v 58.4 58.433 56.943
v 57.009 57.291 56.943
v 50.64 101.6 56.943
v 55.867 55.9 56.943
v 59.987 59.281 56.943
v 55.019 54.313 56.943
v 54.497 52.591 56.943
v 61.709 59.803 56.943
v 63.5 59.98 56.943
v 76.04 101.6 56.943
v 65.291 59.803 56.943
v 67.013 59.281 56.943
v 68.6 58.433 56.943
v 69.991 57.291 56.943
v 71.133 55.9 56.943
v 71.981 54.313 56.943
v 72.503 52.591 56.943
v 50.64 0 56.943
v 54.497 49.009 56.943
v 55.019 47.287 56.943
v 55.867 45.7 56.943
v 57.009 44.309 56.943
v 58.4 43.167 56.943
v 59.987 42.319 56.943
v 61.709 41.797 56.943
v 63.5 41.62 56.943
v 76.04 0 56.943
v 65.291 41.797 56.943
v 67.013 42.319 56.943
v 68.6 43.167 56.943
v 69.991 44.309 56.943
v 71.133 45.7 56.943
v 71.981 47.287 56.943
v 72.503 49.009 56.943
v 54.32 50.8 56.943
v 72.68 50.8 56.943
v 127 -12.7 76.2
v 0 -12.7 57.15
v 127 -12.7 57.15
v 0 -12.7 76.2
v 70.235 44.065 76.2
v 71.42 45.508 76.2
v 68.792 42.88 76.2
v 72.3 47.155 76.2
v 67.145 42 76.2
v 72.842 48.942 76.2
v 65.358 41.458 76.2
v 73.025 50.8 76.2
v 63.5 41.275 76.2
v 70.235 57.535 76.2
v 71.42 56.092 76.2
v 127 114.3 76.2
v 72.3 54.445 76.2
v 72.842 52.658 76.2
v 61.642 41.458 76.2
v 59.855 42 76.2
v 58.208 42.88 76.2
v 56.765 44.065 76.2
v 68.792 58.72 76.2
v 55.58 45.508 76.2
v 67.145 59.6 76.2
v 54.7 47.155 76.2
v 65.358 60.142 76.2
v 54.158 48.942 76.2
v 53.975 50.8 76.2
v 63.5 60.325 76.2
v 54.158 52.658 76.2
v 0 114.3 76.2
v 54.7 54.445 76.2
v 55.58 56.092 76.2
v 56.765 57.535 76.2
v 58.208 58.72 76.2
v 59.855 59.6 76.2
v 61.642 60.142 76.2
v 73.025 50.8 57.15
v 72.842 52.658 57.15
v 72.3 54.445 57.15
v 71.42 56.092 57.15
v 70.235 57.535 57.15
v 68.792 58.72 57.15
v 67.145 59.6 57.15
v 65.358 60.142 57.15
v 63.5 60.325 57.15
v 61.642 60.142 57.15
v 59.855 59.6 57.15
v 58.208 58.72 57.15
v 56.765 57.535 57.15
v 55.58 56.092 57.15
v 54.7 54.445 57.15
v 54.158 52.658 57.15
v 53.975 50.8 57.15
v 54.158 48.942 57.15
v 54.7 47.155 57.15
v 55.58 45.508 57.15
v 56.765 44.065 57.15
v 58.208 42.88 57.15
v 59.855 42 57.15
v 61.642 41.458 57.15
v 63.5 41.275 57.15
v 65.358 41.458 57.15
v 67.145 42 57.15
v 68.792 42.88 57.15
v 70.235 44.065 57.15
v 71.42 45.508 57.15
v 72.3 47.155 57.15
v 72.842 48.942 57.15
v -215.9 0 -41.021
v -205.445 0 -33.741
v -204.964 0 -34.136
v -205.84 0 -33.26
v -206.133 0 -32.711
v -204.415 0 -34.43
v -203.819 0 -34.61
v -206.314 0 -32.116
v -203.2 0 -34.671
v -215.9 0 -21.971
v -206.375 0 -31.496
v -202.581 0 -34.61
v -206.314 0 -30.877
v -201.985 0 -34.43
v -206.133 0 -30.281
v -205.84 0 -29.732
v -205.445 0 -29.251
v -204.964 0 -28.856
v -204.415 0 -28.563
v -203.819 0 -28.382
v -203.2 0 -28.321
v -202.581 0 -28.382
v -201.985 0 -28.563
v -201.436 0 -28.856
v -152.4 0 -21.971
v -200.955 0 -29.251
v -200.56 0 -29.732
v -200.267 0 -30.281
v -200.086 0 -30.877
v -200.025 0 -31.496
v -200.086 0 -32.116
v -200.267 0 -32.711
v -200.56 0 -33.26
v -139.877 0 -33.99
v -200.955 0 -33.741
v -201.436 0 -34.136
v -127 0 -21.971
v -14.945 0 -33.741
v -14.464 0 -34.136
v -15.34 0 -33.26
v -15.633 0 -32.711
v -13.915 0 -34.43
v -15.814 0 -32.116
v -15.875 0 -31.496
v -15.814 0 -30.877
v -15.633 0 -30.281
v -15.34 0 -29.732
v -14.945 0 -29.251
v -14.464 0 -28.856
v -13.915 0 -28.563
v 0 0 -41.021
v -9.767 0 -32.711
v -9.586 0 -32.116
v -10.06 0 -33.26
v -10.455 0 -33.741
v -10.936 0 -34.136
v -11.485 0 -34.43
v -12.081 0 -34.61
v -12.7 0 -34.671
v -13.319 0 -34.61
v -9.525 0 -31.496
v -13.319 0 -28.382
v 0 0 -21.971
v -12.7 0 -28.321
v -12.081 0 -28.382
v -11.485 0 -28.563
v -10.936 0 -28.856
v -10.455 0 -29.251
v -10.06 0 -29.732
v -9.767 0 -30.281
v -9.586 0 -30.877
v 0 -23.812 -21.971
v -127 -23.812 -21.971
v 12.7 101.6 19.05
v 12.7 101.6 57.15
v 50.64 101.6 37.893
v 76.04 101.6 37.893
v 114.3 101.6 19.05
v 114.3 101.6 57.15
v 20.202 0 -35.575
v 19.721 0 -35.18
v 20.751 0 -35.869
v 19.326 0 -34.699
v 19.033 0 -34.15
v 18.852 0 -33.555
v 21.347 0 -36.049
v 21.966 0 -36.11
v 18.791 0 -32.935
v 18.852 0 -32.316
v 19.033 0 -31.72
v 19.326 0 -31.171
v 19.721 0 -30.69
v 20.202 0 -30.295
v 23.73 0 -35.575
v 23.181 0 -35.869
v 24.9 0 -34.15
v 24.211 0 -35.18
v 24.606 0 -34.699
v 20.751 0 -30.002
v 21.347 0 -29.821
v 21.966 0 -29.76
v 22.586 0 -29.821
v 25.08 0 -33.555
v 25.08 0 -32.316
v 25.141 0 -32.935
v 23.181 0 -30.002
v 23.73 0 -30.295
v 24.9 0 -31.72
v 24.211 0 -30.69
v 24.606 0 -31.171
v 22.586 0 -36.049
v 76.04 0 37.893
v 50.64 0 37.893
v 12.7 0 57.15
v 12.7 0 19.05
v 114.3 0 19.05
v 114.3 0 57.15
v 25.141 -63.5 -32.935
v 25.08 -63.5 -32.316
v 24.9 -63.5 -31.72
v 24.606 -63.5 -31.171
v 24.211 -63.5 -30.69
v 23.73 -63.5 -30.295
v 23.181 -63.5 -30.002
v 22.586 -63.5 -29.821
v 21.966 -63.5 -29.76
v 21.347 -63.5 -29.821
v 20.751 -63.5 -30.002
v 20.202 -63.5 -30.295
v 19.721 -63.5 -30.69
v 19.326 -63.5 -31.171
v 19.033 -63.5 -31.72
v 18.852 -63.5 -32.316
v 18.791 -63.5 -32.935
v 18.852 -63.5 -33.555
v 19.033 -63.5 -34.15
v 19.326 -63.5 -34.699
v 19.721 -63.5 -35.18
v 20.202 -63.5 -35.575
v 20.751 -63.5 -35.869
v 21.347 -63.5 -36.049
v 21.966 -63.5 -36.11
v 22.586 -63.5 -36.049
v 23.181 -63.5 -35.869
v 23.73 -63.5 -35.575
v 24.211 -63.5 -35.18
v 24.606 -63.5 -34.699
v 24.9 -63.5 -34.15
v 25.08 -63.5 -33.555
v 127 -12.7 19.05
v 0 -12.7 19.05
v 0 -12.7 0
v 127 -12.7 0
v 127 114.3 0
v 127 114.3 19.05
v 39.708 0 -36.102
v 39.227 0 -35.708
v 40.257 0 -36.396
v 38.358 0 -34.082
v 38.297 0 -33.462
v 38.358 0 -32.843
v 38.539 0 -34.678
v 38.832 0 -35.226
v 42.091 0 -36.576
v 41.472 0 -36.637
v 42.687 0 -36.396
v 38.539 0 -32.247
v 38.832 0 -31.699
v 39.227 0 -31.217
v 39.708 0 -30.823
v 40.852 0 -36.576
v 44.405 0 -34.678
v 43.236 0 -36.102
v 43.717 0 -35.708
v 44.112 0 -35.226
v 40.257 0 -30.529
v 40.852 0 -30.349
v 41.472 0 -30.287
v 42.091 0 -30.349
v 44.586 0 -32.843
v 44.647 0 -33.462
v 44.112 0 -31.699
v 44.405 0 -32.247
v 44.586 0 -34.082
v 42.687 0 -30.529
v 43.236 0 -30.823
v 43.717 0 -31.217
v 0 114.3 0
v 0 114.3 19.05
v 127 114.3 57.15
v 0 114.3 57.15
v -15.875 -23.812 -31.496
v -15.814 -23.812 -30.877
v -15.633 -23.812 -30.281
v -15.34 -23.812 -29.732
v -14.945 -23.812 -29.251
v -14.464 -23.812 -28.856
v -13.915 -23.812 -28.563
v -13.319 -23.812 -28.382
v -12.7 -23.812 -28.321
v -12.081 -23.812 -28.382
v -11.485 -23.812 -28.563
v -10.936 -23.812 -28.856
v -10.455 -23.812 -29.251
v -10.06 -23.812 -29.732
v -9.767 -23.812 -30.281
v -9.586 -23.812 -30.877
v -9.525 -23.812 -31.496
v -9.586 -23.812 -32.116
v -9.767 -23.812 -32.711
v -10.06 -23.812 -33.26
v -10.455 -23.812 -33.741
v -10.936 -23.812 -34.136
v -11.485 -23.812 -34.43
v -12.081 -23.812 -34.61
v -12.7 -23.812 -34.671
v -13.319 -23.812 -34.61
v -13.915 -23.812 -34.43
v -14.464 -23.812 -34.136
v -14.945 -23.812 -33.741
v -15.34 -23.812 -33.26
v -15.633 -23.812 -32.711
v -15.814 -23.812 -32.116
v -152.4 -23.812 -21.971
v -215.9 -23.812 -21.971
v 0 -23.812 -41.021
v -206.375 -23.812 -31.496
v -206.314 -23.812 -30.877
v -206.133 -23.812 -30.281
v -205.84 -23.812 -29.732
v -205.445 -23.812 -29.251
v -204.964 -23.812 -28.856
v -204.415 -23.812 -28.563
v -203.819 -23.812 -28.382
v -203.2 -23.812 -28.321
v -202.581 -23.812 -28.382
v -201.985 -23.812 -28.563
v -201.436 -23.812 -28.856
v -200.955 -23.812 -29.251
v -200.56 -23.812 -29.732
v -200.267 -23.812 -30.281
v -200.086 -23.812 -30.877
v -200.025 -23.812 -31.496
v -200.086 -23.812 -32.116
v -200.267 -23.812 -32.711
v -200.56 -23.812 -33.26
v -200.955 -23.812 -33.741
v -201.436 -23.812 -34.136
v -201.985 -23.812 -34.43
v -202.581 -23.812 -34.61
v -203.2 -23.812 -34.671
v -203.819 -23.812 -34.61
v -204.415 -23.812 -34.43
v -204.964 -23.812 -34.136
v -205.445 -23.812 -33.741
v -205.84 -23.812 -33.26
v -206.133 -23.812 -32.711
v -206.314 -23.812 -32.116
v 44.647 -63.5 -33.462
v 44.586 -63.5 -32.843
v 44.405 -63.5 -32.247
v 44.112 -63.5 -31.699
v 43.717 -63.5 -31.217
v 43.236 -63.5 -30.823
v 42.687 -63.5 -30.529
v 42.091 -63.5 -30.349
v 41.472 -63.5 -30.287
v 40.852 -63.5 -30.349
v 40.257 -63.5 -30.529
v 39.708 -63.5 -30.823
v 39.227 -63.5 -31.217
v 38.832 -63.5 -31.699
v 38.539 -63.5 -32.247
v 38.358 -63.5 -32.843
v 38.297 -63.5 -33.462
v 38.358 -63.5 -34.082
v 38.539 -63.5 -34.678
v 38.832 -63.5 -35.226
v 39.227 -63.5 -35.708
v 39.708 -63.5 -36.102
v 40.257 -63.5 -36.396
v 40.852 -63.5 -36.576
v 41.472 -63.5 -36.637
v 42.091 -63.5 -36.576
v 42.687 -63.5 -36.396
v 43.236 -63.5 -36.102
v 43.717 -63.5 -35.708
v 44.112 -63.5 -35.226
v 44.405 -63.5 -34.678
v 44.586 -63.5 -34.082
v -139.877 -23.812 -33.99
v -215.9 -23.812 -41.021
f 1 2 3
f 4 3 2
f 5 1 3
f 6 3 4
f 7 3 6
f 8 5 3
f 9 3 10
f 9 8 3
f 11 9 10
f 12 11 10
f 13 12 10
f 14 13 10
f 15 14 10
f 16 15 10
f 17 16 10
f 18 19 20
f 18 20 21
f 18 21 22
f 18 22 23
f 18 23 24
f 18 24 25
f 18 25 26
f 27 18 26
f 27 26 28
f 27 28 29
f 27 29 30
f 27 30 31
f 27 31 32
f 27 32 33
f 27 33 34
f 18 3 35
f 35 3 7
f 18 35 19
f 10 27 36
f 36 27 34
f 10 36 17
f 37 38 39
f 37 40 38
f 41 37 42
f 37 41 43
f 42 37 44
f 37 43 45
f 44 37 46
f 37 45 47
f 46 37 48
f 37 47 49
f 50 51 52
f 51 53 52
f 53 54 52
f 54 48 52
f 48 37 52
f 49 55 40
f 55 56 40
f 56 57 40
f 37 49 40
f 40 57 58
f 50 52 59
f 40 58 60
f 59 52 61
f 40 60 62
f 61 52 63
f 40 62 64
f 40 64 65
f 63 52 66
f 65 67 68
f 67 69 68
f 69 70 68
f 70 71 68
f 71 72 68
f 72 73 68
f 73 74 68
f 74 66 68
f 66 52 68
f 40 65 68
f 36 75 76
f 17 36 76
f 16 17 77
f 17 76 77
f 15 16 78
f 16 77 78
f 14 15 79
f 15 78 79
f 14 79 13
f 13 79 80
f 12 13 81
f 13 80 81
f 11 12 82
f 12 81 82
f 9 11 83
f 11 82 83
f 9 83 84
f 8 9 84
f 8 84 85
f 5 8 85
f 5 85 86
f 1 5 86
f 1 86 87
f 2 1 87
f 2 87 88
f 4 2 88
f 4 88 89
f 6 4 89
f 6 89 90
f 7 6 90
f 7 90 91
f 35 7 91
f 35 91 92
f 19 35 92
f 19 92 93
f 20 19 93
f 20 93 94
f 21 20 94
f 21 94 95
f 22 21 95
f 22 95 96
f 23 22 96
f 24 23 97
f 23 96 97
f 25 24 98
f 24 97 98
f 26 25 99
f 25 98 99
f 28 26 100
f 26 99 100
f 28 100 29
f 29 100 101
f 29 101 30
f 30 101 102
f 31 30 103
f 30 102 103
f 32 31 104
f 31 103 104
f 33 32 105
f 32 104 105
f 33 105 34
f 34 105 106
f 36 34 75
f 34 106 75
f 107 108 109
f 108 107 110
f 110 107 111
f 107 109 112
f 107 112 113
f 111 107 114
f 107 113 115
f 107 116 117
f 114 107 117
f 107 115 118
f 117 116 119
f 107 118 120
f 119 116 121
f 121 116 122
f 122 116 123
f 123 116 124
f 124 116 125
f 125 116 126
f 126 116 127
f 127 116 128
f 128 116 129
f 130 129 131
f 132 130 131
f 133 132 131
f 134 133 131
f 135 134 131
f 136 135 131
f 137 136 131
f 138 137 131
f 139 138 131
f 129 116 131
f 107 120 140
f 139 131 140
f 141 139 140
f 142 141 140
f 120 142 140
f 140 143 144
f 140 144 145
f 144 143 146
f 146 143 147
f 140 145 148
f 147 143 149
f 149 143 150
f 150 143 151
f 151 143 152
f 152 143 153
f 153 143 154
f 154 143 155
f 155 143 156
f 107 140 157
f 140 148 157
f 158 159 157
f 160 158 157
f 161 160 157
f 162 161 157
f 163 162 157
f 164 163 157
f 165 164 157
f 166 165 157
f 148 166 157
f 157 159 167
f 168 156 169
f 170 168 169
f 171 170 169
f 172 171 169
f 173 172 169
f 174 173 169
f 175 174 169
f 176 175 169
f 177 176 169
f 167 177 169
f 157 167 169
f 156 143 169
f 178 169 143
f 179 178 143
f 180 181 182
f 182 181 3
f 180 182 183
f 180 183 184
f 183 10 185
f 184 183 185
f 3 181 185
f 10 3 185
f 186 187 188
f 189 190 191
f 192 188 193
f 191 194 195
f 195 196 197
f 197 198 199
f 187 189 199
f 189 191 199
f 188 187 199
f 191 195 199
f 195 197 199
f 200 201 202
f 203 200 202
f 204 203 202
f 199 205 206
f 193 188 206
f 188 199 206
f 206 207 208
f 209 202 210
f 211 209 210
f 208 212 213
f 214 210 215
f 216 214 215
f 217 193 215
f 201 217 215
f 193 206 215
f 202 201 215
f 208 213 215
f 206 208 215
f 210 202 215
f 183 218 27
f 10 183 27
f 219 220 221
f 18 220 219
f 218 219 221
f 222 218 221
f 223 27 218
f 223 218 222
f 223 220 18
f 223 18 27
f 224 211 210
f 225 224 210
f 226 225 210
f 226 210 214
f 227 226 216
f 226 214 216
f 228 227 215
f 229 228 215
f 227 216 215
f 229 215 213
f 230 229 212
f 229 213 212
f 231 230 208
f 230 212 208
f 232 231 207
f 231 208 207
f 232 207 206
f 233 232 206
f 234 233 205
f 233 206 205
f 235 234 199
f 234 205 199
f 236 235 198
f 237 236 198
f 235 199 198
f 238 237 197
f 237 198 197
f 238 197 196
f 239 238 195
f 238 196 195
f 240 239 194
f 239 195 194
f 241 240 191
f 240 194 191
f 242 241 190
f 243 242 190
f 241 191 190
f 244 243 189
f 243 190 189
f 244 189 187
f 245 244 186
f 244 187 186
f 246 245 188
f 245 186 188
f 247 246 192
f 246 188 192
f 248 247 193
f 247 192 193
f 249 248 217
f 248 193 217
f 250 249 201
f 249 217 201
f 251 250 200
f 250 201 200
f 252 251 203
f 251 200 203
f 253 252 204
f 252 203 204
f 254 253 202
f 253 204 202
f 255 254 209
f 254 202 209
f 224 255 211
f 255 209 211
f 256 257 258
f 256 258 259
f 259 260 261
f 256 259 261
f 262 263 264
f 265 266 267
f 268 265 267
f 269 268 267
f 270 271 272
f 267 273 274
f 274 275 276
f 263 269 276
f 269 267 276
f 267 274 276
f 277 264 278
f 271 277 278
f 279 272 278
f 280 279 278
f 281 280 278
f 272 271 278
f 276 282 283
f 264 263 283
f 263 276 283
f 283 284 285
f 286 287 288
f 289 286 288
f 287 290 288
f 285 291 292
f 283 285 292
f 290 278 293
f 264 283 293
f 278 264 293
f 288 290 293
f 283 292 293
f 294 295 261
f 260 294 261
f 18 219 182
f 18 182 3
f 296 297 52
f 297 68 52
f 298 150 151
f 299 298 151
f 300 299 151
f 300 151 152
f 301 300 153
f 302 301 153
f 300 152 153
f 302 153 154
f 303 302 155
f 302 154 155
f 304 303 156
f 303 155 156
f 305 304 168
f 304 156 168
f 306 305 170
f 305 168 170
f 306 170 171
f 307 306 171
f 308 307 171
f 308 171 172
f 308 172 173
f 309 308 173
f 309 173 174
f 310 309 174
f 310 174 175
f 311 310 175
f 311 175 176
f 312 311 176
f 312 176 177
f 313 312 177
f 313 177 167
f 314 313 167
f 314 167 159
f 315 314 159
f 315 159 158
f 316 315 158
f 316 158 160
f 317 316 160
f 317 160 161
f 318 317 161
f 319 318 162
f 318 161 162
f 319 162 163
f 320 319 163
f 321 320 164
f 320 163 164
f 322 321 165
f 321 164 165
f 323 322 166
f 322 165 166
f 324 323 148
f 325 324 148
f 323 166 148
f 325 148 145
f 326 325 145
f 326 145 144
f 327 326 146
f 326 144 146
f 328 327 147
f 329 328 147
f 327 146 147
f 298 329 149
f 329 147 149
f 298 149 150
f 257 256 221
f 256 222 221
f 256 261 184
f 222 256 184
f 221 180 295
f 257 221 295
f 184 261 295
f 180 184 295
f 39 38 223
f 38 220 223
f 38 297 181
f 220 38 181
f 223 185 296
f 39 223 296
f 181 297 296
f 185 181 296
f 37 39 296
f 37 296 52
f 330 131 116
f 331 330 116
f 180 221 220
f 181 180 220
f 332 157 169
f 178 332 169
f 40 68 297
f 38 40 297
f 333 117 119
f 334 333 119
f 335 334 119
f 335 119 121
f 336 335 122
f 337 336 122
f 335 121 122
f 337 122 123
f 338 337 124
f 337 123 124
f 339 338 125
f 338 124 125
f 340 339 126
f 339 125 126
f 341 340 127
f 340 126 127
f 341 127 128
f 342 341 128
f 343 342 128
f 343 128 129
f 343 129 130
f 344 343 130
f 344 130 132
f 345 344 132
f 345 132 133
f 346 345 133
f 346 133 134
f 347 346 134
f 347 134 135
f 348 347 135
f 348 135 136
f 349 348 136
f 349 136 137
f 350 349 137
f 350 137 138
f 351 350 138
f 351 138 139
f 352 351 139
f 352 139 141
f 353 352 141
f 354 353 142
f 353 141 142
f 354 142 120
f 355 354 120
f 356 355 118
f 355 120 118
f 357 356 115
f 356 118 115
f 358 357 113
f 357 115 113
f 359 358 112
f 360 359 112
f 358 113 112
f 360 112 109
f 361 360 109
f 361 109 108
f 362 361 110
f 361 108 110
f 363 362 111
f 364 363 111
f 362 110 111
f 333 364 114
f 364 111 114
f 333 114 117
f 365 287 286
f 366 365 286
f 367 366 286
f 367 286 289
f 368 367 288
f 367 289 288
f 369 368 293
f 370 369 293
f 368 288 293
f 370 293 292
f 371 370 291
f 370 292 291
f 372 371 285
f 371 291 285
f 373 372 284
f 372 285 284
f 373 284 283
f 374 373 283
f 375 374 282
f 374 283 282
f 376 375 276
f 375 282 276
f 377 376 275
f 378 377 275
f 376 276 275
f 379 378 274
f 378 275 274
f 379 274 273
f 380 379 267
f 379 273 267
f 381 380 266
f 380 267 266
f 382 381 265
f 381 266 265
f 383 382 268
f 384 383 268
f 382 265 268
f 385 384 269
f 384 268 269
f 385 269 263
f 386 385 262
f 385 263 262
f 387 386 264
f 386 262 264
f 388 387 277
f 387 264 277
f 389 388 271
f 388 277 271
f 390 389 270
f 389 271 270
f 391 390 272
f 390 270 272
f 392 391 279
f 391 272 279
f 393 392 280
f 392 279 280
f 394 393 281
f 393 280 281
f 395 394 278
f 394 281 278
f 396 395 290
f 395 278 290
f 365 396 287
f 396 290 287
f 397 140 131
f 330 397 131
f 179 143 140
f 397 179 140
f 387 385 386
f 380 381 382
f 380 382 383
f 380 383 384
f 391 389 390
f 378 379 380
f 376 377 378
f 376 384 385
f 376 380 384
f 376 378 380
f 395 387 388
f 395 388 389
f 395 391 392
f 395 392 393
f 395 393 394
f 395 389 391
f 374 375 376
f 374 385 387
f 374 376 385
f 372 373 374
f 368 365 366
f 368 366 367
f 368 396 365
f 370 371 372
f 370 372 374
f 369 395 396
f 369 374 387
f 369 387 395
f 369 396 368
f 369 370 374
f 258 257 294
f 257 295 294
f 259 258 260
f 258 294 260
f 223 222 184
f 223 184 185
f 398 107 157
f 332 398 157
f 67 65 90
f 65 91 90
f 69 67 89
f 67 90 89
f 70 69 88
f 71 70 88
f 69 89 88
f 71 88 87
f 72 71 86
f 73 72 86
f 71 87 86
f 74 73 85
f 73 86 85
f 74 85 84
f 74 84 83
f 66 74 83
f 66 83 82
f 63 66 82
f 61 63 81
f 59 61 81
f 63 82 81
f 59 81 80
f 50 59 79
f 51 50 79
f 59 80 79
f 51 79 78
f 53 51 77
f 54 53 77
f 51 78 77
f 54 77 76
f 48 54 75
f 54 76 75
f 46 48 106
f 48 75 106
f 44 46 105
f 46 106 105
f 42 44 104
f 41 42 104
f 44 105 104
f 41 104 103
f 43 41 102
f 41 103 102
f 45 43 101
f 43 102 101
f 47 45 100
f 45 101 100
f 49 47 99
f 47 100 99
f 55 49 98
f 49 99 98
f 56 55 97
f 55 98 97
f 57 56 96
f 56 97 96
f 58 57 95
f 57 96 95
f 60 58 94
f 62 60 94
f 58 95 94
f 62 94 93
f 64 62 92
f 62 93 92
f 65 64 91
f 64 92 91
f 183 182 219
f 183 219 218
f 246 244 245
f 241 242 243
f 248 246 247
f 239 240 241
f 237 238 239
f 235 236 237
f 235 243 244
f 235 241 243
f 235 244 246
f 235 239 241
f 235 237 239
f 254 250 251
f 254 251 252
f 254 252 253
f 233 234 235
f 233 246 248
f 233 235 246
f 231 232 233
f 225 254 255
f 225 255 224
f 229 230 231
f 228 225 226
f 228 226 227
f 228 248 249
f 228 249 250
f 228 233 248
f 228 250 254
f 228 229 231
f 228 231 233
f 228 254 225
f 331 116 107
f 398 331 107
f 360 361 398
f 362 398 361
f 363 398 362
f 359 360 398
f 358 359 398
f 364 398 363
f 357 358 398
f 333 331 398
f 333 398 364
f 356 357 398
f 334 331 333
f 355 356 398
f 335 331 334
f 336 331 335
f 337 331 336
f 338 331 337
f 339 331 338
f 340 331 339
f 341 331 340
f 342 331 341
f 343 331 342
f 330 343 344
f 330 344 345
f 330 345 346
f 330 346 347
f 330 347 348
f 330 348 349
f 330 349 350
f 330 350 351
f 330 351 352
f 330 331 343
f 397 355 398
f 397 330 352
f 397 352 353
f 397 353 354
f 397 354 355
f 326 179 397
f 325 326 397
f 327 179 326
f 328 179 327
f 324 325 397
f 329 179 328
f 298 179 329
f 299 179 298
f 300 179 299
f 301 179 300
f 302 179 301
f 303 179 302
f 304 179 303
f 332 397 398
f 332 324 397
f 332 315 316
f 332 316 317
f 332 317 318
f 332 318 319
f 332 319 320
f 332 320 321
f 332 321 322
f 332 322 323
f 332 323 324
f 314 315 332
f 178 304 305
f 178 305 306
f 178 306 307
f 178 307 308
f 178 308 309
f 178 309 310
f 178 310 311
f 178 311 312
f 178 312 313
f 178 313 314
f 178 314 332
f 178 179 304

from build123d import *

# Parameters (mm, degrees)
F0_W          = 101.6
F0_H          = 38.1
F1_DEPTH      = 101.6
F2_DEPTH      = 114.3
F2_DEPTH_BACK = 12.7
F3_W          = 25.4
F3_H          = 19.05
F4_DEPTH      = 127
F6_D          = 19.05
F6_DEPTH      = 19.05
F6_TIP        = 5.7231973962
F8_DEPTH      = 23.8125
F10_D         = 6.35
F11_R         = 3.175
F12_DEPTH     = 63.5


with BuildPart() as f1:
    # F0 (on Front) → F1 (new body)
    with BuildSketch(Plane.XZ):
        with Locations((63.5, 38.1)):
            Rectangle(F0_W, F0_H)
    extrude(amount=-F1_DEPTH)

    # F0 (on Front) → F2 (join, two sides)
    with BuildSketch(Plane.XZ) as f2_sk:
        Polygon((0, 57.15), (12.7, 57.15), (114.3, 57.15), (127, 57.15), (127, 76.2), (0, 76.2), align=None)
        Polygon((0, 19.05), (0, 0), (127, 0), (127, 19.05), (114.3, 19.05), (12.7, 19.05), align=None)
    extrude(amount=-F2_DEPTH)
    extrude(f2_sk.sketch, amount=F2_DEPTH_BACK)

    # F3 (on Front) → F4 (cut)
    with BuildSketch(Plane.XZ):
        with Locations((63.3397639349, 47.4175076246)):
            Rectangle(F3_W, F3_H)
    extrude(amount=-F4_DEPTH, mode=Mode.SUBTRACT)

    # F6
    with Locations(Plane.XY.offset(76.2)):
        with Locations((63.5, 50.8)):
            Hole(F6_D / 2, depth=F6_DEPTH)
            with Locations((0, 0, -(F6_DEPTH + F6_TIP / 2))):  # 118° drill point
                Cone(0, F6_D / 2, F6_TIP, mode=Mode.SUBTRACT)


with BuildPart() as f8:
    # F7 (on Front) → F8 (new body)
    with BuildSketch(Plane.XZ):
        Polygon((0, -41.0213880241), (0, -21.9713880241), (-127, -21.9713880241), (-139.8774683475, -33.989675343), (-152.4, -21.9713880241), (-215.9, -21.9713880241), (-215.9, -41.0213880241), align=None)
    extrude(amount=F8_DEPTH)

    # F10 (through all)
    with Locations(Plane.XZ.offset(23.8125)):
        with Locations((-203.2, -31.4963880241), (-12.7, -31.4963880241)):
            Hole(F10_D / 2)


with BuildPart() as f12:
    # F11 (on Front) → F12 (new body)
    with BuildSketch(Plane.XZ):
        with Locations((21.9662263989, -32.935321331)):
            Circle(F11_R)
    extrude(amount=F12_DEPTH)


with BuildPart() as f12b:
    # F11 (on Front) → F12, piece 2 (new body)
    with BuildSketch(Plane.XZ):
        with Locations((41.4718203247, -33.462498337)):
            Circle(F11_R)
    extrude(amount=F12_DEPTH)


solid = Compound([f1.part, f8.part, f12.part, f12b.part])
